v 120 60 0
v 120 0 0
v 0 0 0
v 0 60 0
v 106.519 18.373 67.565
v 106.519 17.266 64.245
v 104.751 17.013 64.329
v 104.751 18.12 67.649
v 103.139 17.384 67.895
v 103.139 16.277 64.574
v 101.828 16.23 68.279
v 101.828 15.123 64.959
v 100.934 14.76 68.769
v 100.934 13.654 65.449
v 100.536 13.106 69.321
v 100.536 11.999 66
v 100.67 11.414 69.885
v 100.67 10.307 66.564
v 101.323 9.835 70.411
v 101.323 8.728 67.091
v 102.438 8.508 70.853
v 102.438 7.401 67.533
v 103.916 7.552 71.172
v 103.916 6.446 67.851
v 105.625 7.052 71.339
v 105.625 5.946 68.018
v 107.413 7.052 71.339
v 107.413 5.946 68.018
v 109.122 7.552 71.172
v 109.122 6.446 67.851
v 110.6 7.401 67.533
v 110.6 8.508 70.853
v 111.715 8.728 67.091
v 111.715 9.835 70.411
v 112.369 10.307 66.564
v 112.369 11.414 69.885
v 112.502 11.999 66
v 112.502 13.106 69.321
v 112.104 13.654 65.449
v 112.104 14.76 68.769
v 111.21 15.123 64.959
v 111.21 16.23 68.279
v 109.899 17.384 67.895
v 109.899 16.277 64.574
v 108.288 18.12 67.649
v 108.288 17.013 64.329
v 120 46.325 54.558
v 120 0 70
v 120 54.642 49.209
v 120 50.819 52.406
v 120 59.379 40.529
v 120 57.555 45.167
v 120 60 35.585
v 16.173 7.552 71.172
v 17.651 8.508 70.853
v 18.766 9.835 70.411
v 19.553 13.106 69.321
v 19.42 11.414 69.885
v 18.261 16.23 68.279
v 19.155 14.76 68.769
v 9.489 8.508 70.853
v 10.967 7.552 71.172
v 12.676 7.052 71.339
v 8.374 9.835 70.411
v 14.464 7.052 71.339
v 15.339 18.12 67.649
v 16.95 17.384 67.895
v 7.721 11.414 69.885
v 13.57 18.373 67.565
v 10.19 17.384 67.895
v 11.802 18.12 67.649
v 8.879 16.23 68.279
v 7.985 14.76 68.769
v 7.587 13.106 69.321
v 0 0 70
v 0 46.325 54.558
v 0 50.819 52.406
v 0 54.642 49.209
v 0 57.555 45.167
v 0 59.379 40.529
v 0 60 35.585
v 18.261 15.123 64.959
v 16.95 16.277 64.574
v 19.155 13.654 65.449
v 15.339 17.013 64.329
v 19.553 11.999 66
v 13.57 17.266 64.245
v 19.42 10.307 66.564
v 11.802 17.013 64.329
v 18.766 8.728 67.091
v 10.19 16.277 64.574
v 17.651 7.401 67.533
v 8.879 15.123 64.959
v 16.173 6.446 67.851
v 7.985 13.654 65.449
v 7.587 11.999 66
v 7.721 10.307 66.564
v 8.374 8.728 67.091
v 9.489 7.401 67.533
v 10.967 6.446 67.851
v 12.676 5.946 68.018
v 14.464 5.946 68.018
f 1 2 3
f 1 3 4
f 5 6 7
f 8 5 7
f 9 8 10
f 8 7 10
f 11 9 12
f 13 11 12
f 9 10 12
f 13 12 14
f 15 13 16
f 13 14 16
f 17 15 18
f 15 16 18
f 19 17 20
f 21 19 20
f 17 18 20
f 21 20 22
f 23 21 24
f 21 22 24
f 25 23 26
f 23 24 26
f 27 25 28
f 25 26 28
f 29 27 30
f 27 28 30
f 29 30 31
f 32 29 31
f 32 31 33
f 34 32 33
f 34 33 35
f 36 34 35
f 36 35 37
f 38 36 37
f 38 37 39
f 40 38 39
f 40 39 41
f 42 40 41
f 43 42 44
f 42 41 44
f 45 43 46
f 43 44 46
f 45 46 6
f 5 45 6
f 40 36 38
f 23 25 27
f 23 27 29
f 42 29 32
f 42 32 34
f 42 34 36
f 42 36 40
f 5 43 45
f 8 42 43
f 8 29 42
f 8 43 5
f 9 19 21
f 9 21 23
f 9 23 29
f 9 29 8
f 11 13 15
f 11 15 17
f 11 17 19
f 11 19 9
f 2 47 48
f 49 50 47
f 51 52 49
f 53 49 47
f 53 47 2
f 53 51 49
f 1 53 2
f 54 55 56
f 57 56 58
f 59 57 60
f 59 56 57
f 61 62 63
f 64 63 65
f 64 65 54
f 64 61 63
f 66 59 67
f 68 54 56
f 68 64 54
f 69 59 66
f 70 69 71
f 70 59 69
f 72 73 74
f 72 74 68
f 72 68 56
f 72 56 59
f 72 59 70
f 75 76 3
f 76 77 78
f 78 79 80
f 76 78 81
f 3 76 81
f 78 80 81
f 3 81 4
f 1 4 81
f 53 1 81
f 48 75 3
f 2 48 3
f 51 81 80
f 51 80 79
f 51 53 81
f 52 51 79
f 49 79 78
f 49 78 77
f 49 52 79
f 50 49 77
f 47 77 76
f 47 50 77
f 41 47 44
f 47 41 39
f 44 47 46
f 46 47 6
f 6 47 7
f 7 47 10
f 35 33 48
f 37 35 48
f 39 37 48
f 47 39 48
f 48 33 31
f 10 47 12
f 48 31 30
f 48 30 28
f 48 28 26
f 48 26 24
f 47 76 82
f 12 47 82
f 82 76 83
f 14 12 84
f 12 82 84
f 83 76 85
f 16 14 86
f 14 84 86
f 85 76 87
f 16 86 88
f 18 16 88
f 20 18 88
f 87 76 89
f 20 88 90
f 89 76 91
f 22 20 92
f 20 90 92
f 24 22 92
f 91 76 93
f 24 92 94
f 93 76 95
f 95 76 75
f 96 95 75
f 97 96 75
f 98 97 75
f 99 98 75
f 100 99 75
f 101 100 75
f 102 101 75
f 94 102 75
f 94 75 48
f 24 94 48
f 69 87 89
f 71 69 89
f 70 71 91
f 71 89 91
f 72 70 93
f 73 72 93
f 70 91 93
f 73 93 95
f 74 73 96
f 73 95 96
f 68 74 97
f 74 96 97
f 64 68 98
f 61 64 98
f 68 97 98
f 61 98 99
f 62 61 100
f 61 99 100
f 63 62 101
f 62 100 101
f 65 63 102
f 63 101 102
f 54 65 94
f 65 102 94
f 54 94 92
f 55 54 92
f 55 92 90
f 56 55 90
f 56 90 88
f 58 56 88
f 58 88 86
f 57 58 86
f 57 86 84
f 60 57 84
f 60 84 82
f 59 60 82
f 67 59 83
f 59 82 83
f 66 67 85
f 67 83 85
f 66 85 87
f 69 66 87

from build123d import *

# Parameters (mm, degrees)
BOSS_EXTRUDE1_DEPTH = 120
FILLET2_R           = 20
SKETCH2_R           = 6
BOSS_EXTRUDE2_DEPTH = 3.5


with BuildPart() as part:
    # Sketch1 → Boss-Extrude1 (new body)
    with BuildSketch(Plane(origin=(0, 0, 0), x_dir=(0, 0, -1), z_dir=(1, 0, 0))):
        Polygon((-70, 0), (0, 0), (0, 60), (-50, 60), align=None)
    extrude(amount=BOSS_EXTRUDE1_DEPTH)

    # Fillet2
    fillet2_edges = [part.edges().sort_by_distance(p)[0] for p in [
        (60, 60, 50),
    ]]
    fillet(fillet2_edges, radius=FILLET2_R)

    # Sketch2 → Boss-Extrude2 (add)
    with BuildSketch(Plane(origin=(0, 21, 63), x_dir=(1, 0, 0), z_dir=(0, 0.316227766016838, 0.9486832980505138))):
        with Locations(Location((13.570097229, -9.935839792, 0), (0, 0, 90))):
            Circle(SKETCH2_R)
        with Locations(Location((106.519183085, -9.935839792, 0), (0, 0, 90))):
            Circle(SKETCH2_R)
    extrude(amount=BOSS_EXTRUDE2_DEPTH)


solid = part.part
